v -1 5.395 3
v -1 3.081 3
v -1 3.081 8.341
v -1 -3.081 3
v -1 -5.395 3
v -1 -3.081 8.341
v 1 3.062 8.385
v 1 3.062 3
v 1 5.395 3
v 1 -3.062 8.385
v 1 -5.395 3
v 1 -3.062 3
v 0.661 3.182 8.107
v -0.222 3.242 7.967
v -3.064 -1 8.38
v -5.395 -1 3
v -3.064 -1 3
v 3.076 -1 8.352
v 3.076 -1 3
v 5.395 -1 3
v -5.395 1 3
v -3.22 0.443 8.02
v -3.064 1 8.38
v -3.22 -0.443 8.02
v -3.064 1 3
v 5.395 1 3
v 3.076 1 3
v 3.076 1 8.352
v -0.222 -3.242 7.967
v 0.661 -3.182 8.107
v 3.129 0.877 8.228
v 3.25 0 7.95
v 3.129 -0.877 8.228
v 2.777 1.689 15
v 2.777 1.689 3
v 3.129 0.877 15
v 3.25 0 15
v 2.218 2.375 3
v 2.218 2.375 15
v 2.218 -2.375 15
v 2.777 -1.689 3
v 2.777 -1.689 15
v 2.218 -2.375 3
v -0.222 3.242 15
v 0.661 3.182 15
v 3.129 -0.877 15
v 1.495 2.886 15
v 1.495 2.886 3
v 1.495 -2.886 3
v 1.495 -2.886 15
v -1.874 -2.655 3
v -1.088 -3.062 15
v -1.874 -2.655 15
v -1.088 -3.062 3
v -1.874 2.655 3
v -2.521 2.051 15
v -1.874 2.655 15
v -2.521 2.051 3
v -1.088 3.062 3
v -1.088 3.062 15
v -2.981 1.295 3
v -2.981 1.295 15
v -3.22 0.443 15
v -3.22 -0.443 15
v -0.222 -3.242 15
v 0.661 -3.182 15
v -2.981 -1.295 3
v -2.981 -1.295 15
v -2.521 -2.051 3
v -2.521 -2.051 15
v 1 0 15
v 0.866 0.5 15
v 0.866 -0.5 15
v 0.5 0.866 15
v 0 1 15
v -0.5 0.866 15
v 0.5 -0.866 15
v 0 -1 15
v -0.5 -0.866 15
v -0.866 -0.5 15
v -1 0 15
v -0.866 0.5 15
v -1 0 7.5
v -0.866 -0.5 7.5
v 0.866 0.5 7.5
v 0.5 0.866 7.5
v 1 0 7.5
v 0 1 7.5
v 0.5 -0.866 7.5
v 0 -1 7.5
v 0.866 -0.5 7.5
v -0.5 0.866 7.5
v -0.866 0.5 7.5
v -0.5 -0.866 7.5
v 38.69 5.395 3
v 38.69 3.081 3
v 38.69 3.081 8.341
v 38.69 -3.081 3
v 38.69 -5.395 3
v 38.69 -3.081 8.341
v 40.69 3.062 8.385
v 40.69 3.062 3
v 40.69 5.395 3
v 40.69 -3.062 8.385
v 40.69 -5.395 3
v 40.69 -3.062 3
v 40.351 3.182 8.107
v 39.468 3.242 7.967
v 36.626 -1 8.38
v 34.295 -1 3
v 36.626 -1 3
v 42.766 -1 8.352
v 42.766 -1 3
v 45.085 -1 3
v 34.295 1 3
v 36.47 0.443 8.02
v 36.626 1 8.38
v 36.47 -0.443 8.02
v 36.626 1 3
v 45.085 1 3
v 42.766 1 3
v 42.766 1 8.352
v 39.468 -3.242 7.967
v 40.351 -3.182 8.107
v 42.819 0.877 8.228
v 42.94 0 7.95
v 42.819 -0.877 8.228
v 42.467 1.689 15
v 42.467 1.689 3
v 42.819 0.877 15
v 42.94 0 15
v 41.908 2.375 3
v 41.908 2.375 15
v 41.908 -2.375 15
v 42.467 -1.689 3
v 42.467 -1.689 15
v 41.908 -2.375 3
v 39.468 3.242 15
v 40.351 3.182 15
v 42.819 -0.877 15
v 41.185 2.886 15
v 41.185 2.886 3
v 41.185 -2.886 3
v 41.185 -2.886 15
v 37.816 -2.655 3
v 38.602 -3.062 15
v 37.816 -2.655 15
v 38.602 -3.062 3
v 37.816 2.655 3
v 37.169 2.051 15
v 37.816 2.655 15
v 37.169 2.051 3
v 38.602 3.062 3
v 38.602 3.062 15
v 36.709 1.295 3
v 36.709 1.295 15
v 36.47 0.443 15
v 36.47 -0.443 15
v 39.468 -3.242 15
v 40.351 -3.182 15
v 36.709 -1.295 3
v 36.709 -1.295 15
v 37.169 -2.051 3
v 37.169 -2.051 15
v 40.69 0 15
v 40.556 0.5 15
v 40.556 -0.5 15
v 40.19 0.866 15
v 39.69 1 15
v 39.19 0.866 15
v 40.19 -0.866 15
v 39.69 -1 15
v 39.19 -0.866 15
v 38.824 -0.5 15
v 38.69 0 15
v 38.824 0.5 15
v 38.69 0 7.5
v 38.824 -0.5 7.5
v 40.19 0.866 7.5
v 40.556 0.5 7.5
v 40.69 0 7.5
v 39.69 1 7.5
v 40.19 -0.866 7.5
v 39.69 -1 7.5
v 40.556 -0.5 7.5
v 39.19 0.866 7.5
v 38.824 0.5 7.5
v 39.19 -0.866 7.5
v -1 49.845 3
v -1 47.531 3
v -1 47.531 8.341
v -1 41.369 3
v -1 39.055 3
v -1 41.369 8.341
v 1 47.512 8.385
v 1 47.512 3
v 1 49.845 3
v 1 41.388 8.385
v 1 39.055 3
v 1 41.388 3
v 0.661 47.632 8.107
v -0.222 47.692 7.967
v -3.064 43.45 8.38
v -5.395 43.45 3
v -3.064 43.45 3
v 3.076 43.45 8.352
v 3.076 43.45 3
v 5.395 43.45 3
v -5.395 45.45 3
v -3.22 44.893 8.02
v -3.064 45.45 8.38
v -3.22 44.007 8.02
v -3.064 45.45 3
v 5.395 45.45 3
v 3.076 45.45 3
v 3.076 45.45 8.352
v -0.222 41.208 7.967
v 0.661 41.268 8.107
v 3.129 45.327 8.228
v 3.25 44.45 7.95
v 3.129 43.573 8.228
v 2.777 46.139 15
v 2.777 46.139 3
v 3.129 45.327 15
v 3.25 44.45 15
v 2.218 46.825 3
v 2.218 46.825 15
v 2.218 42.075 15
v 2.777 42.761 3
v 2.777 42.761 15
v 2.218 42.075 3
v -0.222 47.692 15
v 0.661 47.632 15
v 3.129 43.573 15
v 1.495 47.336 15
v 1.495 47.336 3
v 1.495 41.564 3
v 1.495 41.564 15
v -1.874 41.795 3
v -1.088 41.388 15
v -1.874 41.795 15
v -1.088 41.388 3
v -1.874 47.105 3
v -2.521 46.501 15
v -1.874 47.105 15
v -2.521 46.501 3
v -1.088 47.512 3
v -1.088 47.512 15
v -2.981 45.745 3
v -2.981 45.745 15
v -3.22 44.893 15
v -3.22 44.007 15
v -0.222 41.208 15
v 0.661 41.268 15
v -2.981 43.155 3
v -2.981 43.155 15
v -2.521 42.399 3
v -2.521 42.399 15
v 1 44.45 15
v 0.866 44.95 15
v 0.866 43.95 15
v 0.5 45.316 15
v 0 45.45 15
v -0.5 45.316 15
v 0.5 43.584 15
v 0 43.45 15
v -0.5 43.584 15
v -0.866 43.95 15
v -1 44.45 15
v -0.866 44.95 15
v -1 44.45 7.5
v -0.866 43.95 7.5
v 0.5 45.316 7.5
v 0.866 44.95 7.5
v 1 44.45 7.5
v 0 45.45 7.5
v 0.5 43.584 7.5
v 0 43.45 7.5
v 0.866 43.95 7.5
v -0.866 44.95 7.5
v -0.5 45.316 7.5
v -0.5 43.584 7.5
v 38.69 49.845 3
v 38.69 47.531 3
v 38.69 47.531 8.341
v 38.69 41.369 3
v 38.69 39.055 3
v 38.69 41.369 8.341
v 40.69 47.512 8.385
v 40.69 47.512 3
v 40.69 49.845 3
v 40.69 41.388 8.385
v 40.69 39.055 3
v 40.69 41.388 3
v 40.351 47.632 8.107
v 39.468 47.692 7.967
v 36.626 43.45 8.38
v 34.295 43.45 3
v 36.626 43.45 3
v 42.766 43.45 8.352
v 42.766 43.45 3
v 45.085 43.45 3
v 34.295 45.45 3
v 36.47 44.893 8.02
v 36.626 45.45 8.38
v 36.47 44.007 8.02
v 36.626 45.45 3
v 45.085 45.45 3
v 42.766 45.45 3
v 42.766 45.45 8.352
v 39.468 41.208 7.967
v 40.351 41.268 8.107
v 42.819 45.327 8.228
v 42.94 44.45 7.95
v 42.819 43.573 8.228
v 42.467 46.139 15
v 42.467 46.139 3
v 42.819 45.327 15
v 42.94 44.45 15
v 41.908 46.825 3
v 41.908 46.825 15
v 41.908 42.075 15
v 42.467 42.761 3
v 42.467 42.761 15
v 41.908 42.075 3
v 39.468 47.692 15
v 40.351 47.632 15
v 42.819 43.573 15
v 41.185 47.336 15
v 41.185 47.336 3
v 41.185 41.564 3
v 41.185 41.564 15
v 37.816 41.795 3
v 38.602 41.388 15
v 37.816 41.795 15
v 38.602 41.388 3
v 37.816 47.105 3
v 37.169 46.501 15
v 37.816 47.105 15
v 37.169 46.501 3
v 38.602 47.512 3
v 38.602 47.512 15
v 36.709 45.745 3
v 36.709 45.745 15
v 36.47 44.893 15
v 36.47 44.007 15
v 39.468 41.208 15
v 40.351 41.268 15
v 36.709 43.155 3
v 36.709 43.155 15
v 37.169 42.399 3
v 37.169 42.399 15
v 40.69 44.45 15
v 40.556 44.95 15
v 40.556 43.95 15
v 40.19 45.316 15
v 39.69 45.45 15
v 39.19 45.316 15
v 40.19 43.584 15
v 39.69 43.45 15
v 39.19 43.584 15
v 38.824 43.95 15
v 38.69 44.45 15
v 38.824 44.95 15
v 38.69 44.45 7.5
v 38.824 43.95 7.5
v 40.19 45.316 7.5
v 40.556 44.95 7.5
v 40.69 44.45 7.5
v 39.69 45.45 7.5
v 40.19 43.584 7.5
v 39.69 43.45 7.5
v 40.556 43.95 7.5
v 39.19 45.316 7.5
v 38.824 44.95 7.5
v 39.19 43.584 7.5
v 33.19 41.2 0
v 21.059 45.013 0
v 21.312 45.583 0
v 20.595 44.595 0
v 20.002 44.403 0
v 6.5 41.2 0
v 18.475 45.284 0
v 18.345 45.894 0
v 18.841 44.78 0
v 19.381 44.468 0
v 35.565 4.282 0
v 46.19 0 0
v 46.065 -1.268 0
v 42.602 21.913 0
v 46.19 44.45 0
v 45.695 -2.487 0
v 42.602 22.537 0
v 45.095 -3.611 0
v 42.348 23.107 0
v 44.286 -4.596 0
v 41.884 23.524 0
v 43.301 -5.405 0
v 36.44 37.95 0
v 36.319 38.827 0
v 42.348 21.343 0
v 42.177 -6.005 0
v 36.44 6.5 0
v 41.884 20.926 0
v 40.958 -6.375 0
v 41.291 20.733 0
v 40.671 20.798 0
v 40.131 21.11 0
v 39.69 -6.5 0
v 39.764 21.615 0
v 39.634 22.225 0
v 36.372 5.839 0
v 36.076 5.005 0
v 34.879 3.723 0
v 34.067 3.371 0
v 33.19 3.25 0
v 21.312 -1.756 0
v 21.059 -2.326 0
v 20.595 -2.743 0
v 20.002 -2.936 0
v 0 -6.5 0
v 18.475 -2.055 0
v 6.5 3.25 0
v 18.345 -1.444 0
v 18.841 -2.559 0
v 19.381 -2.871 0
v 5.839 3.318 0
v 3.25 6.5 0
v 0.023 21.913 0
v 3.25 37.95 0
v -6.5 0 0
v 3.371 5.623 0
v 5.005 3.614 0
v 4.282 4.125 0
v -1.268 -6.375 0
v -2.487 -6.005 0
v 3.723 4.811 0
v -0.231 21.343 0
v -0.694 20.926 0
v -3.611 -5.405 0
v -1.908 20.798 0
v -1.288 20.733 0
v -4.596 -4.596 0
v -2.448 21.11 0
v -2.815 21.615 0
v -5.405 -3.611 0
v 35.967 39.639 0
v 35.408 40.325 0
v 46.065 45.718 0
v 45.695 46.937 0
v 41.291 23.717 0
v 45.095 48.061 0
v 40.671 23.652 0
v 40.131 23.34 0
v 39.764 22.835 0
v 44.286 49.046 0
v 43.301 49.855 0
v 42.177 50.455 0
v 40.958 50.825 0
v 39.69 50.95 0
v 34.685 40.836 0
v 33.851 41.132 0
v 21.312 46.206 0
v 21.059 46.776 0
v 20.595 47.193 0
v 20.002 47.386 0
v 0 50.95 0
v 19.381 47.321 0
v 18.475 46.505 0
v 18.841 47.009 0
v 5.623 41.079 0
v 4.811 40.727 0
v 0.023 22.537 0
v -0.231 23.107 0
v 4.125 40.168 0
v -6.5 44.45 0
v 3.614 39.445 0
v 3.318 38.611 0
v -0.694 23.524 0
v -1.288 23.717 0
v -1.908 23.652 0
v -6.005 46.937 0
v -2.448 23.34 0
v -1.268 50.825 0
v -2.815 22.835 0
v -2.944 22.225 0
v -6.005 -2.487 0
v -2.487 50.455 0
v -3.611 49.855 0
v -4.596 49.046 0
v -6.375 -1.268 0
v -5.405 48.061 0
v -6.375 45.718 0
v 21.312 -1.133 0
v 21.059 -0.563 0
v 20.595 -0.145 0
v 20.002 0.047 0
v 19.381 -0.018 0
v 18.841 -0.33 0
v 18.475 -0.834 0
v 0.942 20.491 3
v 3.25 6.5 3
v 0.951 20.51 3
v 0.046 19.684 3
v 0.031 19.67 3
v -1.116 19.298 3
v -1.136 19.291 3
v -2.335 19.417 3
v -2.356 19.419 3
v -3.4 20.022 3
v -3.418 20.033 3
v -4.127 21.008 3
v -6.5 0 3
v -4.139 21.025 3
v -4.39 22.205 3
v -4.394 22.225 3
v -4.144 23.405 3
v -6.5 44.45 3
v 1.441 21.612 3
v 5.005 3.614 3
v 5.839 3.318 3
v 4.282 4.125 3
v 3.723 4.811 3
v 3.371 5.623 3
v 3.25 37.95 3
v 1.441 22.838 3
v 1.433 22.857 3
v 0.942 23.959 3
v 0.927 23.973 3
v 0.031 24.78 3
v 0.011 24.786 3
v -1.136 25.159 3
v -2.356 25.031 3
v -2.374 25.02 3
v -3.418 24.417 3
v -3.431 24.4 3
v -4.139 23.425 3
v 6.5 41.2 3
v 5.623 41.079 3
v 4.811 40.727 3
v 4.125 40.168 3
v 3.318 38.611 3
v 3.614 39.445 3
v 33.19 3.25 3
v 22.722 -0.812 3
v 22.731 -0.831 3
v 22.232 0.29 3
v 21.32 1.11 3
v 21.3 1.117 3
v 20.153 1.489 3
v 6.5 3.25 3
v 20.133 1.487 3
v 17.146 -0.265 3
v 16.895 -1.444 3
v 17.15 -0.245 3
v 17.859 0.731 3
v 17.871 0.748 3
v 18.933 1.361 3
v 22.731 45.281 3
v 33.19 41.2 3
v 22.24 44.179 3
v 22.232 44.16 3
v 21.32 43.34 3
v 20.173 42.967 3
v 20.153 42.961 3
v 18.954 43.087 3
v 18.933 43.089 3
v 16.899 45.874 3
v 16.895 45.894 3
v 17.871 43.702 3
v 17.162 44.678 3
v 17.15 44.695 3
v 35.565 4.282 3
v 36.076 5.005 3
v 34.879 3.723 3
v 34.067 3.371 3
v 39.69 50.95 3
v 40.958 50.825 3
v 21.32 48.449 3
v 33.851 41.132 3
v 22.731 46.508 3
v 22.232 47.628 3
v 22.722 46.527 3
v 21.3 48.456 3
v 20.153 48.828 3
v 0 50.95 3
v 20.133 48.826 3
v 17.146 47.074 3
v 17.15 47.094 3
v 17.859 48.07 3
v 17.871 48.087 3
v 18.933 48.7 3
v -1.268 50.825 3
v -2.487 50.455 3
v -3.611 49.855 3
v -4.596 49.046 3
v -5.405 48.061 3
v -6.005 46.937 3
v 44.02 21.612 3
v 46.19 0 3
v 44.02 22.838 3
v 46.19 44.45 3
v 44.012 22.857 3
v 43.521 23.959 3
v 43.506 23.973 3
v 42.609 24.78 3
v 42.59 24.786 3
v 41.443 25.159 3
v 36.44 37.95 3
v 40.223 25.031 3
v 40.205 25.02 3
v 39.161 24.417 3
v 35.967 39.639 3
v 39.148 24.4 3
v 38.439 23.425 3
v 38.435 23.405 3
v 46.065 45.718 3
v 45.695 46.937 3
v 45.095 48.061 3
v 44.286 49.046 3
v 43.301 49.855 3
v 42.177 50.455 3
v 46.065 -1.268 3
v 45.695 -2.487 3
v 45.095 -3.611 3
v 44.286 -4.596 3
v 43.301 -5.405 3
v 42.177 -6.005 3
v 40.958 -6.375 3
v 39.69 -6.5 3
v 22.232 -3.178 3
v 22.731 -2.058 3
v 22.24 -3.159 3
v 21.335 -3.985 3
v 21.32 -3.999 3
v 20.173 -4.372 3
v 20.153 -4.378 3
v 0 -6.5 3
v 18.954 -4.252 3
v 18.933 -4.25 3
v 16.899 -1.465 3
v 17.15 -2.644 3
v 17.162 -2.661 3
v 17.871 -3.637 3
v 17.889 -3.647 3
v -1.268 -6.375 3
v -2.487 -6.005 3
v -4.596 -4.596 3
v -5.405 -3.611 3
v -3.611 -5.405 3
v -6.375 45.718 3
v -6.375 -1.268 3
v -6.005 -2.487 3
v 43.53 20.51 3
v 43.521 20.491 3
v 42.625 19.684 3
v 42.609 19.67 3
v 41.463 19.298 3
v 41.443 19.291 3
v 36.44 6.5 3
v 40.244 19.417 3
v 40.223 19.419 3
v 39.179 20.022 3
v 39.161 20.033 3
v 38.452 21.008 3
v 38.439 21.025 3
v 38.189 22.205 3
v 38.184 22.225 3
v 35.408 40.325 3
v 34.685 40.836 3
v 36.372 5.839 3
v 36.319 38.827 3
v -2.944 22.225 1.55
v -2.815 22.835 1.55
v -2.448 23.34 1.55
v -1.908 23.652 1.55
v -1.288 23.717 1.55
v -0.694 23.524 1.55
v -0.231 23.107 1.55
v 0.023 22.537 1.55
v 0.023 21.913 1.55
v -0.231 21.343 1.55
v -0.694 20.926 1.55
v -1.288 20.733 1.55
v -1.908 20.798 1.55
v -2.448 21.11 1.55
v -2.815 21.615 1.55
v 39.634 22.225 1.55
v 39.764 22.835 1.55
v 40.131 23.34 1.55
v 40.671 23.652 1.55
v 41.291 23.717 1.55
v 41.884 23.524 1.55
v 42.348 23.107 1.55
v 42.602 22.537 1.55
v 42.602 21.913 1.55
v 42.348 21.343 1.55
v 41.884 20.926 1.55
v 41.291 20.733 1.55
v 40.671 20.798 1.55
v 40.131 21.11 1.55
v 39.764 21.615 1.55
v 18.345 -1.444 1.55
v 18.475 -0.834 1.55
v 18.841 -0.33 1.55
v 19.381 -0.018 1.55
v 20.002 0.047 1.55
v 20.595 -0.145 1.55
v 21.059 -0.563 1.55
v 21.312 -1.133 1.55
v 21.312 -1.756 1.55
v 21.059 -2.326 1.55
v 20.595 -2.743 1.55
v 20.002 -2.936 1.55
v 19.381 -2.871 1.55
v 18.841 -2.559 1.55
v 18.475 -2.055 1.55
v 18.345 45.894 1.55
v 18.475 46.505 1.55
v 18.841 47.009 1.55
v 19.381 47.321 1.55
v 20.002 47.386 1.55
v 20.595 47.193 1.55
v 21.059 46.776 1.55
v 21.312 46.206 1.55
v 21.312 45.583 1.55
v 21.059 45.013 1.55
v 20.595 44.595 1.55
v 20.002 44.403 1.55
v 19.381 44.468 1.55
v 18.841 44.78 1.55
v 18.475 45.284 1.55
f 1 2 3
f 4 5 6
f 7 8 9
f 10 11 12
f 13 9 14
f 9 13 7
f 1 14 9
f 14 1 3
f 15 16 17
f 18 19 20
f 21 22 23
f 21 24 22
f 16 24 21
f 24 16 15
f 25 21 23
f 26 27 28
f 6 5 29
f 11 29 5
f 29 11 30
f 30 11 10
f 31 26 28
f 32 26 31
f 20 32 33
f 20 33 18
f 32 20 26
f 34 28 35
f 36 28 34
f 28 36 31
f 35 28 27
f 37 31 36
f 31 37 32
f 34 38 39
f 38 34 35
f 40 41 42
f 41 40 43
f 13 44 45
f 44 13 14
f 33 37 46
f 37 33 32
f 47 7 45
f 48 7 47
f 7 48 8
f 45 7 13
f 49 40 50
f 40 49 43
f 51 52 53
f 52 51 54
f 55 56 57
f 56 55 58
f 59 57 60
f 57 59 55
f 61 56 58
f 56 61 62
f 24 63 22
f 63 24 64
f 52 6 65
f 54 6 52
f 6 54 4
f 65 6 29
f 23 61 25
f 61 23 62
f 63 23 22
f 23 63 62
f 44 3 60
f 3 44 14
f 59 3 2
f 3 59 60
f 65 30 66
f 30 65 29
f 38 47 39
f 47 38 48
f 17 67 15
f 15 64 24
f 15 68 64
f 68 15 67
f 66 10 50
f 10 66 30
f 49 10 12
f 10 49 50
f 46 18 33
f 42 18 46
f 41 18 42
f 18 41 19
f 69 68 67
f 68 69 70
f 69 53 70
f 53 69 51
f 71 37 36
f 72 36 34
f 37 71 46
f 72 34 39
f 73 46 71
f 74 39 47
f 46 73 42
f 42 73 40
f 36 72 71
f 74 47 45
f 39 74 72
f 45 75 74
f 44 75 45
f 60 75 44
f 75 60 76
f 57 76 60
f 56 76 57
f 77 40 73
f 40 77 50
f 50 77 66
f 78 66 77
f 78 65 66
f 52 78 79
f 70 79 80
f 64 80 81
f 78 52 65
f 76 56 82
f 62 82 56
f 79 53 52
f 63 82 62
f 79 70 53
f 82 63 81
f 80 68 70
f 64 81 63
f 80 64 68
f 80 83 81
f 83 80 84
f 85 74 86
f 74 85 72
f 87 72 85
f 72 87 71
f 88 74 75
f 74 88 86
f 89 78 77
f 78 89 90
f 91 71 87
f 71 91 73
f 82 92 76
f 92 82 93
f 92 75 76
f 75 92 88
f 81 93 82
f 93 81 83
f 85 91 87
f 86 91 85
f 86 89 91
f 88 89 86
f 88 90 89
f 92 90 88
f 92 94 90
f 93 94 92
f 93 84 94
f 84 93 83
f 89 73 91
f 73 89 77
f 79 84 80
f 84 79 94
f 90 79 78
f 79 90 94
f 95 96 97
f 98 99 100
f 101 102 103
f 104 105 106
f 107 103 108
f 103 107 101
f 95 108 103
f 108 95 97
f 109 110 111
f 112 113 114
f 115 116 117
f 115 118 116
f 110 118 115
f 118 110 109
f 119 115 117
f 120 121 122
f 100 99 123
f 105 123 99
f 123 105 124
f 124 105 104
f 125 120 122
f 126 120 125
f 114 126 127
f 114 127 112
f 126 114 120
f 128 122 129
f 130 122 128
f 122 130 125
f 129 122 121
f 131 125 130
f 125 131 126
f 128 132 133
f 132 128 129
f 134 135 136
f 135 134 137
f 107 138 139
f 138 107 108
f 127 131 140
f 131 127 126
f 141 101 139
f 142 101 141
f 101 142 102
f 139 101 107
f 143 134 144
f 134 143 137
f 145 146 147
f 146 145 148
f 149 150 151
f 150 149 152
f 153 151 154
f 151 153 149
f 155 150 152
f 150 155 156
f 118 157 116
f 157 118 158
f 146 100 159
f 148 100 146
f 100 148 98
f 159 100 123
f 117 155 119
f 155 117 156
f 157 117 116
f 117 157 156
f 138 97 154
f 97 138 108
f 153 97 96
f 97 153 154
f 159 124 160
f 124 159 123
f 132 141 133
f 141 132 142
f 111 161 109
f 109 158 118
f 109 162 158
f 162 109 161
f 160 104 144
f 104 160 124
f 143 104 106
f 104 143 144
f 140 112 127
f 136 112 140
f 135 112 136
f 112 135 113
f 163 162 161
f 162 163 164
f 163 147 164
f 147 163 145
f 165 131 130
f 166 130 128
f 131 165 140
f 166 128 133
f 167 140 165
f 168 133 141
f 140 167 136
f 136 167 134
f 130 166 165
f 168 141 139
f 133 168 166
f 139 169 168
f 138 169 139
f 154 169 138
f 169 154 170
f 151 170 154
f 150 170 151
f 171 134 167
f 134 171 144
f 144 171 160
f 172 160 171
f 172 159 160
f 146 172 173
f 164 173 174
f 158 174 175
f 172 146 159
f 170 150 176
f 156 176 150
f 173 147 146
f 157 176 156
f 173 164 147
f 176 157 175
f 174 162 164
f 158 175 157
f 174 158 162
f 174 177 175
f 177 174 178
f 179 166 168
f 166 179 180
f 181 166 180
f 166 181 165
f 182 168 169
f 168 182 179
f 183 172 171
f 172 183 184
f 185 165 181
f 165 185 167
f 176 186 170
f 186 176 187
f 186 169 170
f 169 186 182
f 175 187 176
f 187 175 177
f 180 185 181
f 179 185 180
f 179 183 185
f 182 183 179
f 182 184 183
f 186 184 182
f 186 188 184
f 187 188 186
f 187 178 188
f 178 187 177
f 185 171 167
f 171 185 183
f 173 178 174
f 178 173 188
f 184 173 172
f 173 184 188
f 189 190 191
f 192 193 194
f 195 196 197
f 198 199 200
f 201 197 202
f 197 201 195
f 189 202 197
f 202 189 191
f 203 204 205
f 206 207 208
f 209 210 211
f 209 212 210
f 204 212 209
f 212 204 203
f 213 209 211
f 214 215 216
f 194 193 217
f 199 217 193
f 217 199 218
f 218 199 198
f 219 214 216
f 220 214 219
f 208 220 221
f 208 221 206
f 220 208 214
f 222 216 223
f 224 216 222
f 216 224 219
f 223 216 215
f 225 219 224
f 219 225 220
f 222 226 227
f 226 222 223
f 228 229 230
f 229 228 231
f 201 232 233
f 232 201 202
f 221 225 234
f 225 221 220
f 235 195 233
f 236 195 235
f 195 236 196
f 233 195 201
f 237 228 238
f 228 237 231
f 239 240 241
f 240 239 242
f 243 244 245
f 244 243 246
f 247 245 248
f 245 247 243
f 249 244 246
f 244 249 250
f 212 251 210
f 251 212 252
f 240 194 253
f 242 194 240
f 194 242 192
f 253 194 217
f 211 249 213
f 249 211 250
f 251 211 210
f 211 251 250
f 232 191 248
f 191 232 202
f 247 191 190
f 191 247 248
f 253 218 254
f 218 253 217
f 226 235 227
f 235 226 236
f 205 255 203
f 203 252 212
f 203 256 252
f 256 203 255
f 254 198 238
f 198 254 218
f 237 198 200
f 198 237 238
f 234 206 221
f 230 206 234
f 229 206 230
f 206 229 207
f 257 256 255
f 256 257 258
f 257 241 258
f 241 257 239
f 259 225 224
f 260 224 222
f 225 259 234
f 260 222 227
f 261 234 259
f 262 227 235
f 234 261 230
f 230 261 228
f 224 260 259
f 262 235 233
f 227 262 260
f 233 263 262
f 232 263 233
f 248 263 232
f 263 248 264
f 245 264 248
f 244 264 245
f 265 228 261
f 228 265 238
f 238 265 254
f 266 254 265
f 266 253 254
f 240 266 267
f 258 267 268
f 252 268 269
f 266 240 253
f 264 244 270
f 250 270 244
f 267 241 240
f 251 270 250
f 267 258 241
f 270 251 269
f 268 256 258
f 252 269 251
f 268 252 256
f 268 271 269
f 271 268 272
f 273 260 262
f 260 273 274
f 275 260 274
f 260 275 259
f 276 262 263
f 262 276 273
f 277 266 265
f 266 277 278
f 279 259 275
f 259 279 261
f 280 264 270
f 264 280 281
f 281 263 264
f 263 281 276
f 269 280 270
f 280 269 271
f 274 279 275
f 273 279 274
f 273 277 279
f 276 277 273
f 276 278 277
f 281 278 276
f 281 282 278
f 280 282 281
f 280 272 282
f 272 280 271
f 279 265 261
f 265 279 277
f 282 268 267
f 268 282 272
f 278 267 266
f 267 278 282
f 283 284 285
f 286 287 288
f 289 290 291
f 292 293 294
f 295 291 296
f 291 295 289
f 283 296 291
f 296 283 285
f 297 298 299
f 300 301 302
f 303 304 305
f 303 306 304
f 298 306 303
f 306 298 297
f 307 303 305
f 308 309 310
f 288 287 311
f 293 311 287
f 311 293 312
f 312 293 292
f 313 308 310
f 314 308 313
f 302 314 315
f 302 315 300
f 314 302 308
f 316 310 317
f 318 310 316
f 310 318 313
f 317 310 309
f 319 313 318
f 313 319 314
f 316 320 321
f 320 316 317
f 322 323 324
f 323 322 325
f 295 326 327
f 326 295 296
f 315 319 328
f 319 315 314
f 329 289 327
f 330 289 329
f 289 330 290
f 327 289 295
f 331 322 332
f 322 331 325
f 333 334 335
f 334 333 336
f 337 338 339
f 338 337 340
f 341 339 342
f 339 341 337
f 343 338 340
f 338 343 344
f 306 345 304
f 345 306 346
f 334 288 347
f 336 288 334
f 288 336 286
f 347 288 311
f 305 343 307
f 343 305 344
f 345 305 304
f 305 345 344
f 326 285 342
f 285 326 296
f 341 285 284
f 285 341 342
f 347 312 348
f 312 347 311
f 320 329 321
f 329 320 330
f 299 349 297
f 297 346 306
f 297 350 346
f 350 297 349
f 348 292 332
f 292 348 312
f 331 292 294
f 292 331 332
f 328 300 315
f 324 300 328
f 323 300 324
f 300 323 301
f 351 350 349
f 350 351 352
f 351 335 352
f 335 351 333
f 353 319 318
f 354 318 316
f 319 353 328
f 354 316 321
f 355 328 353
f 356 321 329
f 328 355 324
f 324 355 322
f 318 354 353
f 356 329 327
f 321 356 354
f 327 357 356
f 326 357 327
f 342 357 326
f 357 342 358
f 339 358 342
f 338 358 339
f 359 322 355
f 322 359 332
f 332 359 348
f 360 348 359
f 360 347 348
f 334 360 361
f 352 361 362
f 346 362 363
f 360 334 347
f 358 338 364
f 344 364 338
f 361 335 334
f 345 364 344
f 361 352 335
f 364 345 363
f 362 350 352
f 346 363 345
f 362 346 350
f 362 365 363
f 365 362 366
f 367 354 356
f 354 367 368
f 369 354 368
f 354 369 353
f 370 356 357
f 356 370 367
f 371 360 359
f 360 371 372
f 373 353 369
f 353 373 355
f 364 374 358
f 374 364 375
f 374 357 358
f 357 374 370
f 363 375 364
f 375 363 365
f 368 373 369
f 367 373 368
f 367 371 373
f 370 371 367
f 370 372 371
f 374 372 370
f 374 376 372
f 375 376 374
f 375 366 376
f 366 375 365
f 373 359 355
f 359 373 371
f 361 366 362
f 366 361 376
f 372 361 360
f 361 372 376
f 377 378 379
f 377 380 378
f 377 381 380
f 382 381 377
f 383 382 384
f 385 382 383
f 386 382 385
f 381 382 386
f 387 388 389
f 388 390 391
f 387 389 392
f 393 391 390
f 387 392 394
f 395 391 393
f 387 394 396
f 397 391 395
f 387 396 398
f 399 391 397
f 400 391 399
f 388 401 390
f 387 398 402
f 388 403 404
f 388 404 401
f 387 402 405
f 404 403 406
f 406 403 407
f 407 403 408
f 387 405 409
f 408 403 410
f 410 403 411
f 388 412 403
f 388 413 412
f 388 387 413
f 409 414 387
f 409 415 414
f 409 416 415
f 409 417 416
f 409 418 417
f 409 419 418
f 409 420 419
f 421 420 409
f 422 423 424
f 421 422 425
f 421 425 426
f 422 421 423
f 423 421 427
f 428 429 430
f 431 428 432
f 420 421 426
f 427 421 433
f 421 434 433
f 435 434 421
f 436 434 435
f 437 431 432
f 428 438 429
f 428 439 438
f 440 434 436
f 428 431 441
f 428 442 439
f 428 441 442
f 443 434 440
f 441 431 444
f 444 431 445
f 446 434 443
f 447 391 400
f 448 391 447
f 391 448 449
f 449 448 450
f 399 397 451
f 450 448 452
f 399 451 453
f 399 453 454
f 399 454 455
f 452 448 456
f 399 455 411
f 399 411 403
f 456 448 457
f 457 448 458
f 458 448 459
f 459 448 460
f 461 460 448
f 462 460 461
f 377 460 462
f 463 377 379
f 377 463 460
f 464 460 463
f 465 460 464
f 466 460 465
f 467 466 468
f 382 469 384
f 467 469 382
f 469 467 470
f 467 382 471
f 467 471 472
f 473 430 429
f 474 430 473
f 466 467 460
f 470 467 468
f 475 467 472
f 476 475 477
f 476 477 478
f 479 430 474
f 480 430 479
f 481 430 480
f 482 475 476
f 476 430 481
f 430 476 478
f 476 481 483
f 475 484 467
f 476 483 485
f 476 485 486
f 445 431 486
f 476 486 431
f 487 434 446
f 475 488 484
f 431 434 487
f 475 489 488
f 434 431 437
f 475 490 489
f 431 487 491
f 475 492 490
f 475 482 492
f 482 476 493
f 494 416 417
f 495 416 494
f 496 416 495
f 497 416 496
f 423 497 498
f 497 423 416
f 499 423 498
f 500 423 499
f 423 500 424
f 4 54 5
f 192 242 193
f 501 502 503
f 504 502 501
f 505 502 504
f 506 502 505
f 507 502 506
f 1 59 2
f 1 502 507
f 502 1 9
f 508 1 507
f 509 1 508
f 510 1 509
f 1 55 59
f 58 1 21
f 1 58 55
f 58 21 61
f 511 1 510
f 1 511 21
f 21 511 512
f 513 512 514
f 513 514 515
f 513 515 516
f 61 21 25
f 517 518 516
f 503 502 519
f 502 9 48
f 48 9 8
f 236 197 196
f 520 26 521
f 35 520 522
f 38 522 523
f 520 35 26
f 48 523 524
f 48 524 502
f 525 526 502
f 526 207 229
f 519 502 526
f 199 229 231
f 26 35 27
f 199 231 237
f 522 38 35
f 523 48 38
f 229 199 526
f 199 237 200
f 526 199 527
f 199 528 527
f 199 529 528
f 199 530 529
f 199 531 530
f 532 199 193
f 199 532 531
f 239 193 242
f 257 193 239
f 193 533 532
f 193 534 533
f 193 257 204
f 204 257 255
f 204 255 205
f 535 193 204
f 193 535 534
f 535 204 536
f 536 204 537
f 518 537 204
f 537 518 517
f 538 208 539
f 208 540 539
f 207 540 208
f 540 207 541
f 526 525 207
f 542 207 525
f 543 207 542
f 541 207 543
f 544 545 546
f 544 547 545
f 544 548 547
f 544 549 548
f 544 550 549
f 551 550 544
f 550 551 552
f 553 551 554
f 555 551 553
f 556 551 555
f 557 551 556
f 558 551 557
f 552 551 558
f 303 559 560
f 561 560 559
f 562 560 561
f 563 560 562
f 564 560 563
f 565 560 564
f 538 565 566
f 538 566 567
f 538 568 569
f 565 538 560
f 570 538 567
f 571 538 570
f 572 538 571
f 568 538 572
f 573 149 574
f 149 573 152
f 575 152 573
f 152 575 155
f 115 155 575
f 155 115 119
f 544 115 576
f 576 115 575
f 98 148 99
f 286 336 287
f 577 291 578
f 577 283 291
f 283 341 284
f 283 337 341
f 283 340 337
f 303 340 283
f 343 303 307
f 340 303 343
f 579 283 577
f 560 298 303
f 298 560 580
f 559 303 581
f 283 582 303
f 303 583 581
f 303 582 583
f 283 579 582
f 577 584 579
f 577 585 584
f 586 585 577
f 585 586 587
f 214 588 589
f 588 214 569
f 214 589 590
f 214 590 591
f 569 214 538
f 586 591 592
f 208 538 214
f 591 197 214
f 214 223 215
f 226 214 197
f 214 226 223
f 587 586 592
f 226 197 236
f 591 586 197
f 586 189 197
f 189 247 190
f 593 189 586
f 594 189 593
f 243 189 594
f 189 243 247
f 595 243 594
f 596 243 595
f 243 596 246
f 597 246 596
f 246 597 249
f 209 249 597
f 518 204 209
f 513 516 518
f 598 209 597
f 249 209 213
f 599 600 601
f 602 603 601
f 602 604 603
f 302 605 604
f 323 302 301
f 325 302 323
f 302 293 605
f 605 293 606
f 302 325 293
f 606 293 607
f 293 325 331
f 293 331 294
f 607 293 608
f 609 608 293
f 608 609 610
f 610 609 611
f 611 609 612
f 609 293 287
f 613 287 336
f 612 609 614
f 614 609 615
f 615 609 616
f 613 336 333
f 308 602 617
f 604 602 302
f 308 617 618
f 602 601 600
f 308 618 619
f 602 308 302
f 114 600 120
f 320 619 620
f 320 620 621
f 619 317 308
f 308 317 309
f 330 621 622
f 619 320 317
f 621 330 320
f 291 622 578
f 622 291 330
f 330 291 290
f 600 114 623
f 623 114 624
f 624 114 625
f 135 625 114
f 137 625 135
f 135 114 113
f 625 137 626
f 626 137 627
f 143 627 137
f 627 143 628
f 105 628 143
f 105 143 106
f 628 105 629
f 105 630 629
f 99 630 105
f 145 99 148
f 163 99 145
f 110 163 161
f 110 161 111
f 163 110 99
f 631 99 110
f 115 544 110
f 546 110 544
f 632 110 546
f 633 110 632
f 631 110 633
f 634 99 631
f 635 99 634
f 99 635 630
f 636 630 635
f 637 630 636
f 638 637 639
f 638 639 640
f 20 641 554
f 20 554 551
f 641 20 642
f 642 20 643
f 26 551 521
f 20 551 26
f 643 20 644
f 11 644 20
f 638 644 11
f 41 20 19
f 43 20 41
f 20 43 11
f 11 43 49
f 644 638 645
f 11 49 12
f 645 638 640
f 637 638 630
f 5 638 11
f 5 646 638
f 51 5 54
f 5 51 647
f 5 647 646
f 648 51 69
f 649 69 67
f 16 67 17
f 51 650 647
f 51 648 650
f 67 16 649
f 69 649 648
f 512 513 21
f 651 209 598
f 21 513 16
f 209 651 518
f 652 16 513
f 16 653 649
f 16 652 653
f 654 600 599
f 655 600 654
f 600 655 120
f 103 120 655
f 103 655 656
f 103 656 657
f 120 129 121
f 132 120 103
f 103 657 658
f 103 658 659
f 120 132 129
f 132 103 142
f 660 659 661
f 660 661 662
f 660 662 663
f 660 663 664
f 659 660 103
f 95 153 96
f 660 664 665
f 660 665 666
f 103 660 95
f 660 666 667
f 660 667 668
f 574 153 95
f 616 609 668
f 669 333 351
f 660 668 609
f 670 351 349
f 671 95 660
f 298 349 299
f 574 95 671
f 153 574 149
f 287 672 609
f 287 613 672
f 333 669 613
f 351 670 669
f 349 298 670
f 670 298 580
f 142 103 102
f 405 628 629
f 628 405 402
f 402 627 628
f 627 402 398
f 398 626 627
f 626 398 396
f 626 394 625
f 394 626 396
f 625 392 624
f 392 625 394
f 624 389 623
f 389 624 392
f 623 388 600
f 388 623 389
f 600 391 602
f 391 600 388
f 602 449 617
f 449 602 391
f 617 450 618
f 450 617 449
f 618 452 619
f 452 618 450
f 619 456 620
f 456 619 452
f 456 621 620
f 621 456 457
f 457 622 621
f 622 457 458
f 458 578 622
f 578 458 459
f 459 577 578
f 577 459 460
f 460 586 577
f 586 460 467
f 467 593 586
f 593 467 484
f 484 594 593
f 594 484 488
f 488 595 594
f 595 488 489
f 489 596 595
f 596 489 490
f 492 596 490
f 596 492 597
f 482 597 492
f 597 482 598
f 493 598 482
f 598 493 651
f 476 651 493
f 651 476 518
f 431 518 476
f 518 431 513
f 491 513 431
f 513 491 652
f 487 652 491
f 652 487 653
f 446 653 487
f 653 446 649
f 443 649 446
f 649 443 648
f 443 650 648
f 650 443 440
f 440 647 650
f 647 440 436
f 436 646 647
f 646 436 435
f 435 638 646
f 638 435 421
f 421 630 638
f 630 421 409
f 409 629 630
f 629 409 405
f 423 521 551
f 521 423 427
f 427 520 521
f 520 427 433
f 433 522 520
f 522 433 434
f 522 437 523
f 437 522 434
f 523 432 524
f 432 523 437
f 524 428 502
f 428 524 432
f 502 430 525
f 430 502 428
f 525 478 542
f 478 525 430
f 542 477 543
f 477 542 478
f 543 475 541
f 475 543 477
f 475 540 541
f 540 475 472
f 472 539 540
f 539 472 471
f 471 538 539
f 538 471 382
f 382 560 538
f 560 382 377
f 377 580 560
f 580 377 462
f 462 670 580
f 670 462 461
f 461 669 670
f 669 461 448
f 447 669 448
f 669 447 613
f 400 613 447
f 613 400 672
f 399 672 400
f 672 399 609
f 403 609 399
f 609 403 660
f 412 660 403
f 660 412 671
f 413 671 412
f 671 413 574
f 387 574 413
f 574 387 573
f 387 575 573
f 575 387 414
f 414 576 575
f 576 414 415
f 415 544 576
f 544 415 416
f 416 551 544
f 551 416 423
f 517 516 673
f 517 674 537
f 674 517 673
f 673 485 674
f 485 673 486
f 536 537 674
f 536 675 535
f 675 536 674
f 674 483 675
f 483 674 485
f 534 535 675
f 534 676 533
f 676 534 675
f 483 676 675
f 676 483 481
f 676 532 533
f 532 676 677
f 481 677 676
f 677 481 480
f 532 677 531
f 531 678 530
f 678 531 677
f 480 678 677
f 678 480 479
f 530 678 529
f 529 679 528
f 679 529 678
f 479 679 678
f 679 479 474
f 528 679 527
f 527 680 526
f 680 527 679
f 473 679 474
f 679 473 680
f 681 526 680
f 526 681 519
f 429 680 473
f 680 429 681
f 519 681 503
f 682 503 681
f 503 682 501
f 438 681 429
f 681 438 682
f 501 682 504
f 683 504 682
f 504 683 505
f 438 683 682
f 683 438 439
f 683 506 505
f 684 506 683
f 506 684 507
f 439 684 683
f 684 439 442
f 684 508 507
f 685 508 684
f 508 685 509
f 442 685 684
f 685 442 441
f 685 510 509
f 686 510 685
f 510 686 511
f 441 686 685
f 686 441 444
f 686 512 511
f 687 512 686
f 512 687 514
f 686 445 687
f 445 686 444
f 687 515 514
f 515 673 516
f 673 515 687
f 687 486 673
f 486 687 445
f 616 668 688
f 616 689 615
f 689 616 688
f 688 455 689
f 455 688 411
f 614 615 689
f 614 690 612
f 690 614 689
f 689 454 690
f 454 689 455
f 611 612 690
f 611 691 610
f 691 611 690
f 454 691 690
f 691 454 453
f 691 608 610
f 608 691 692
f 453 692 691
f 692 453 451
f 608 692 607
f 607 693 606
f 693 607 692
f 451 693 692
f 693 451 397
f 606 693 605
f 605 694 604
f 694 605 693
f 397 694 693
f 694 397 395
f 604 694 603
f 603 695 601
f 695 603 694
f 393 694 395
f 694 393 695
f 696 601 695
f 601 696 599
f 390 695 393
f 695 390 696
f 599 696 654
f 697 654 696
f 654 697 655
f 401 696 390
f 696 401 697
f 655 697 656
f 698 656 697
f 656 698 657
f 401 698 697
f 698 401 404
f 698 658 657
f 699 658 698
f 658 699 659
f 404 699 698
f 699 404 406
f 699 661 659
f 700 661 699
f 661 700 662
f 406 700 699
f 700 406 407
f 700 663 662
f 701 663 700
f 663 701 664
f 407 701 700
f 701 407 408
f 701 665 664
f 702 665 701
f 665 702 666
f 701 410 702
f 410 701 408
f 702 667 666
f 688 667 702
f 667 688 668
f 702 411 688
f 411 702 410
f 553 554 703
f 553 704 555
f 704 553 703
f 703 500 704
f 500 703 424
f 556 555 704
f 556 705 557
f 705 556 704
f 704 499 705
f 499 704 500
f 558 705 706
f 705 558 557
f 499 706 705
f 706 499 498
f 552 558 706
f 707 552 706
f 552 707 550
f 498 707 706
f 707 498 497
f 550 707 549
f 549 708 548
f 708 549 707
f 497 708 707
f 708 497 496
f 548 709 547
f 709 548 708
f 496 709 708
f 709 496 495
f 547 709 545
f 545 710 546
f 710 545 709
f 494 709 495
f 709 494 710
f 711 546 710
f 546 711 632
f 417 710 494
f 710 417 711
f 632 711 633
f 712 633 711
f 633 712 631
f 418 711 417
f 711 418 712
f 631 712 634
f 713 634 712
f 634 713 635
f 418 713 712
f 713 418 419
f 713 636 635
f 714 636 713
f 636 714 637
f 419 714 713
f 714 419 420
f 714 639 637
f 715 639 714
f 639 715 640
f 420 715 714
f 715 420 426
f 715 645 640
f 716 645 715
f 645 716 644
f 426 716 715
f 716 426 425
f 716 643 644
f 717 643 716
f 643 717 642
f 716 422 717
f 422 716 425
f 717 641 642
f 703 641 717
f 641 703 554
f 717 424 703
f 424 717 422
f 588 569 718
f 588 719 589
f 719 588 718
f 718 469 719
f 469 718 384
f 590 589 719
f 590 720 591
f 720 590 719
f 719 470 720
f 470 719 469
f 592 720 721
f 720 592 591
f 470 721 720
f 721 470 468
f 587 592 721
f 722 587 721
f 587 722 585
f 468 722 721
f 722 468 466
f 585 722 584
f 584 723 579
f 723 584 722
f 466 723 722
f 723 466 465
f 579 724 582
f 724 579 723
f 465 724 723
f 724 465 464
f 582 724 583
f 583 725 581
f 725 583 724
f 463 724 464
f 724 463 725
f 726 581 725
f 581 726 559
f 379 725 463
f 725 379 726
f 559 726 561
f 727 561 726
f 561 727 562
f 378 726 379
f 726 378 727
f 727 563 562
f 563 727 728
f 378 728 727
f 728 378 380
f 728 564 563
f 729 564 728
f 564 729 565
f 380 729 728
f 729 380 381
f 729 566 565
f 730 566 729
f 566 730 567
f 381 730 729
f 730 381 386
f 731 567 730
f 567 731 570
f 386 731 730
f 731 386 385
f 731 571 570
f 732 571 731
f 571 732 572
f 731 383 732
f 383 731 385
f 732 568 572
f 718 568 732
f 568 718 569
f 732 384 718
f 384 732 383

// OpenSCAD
//------------------------------------------------------------------
/*

4 Pillar PCB Mount

*/
//------------------------------------------------------------------

mount_width = 39.69;
mount_length = 44.45;
mount_height = 15;
mount_base_z = 3;
mount_hole_diameter = 3;

pillar_diameter = 6.5;
pillar_hole_diameter = 2;

//------------------------------------------------------------------

// small tweak to avoid differencing artifacts
epsilon = 0.05;

// control the number of facets on cylinders
facet_epsilon = 0.03;
function facets(r) = 180 / acos(1 - (facet_epsilon / r));

// rounded polygons
module rounded(r=1) {
  offset(r=r, $fn=facets(r)) offset(r=-r, $fn=facets(r)) children(0);
}

// filleted polygons
module filleted(r=1) {
  offset(r=-r, $fn=facets(r)) render() offset(r=r, $fn=facets(r)) children(0);
}

//------------------------------------------------------------------
// Mounting pillar with support webs

// single web
module pillar_web(
  web_height,
  web_radius,
  web_width
) {
  h = web_height;
  r = web_radius;
  w = web_width;
  points = [
    [0,0],
    [r,0],
    [0,h],
  ];
  rotate([90,0,0]) translate([0,0,-w/2]) linear_extrude(height=w) polygon(points=points);
}

// multiple webs
module pillar_webs(
  number_webs,
  web_height,
  web_radius,
  web_width
) {
  theta = 360 / number_webs;
  for (i = [1:number_webs]) {
    rotate([0,0,i * theta]) pillar_web(web_height, web_radius, web_width);
  }
}

// pillar
module pillar(
  pillar_height,
  pillar_radius
) {
  h = pillar_height;
  r = pillar_radius;
  cylinder(h=h, r=r, $fn=facets(r));
}

module pillar_hole(
  pillar_height,
  hole_depth,
  hole_radius
) {
  h = hole_depth + epsilon;
  r = hole_radius;
  z_ofs = pillar_height - hole_depth;
  translate([0,0,z_ofs]) cylinder(h=h, r=r, $fn=facets(r));
}

// pillar with webs
module webbed_pillar(
  pillar_height,
  pillar_radius,
  hole_depth,
  hole_radius,
  number_webs,
  web_height,
  web_radius,
  web_width,
) {
  intersection () {
    difference() {
      union() {
        pillar(pillar_height, pillar_radius);
        pillar_webs(number_webs, web_height, web_radius, web_width);
      }
      pillar_hole(pillar_height, hole_depth, hole_radius);
    }
    // Cut off any part of the webs that protrude from the
    // top of the pillar.
    cylinder(r = web_radius * 2, h = pillar_height);
  }
}

//------------------------------------------------------------------

// countersunk hole
module hole_countersunk(
  length,
  radius,
) {
  l = length;
  r = radius;
  if (r > l) {
    points = [
      [0, 0],
      [(2 * r) - l, 0],
      [2 * r, l],
      [0, l]
    ];
    rotate_extrude($fn=facets(r)) polygon(points=points);
  } else {
    points = [
      [0, 0],
      [r, 0],
      [r, l - r],
      [2 * r, l],
      [0, l]
    ];
    rotate_extrude($fn=facets(r)) polygon(points=points);
  }
}

//------------------------------------------------------------------

module mount_pillar() {
  z = mount_height - mount_base_z + epsilon;
  z_ofs = mount_base_z - epsilon;
  translate([0,0,z_ofs]) webbed_pillar(
    pillar_height = z,
    pillar_radius = pillar_diameter / 2,
    hole_depth = mount_height / 2,
    hole_radius = pillar_hole_diameter / 2,
    number_webs = 4,
    web_height = mount_height / 1.2,
    web_radius = pillar_diameter / 1.2,
    web_width = 2
  );
}

module pcb_mount_hole() {
  h = mount_base_z + (2 * epsilon);
  r = mount_hole_diameter / 2;
  translate([0,0,-epsilon])hole_countersunk(h, r);
}

module mount_base_2d() {
  w = mount_width;
  l = mount_length;
  points = [
    [0,0],
    [w,0],
    [w,l],
    [0,l],
  ];
  polygon(points=points);
}

//------------------------------------------------------------------

module pcb_mount_base() {
  r0 = pillar_diameter;
  r1 = r0 / 2.0;
  h = mount_base_z;
  linear_extrude(height = h) difference() {
    offset(r=r0, $fn=facets(r0)) mount_base_2d();
    rounded(r=r1) offset(r=-r1, $fn=facets(r1)) mount_base_2d();
  }
}

module pcb_mount_pillars() {
  w = mount_width;
  l = mount_length;
  translate([0,0]) mount_pillar();
  translate([w,0]) mount_pillar();
  translate([0,l]) mount_pillar();
  translate([w,l]) mount_pillar();
}

module pcb_mount_holes() {
  w = mount_width;
  l = mount_length;
  ofs = pillar_diameter / 4.5;
  y_mid = l/2;
  x_mid = w/2;
  translate([-ofs,y_mid]) pcb_mount_hole();
  translate([w+ofs, y_mid]) pcb_mount_hole();
  translate([x_mid,-ofs]) pcb_mount_hole();
  translate([x_mid,l+ofs]) pcb_mount_hole();
}

//------------------------------------------------------------------

module pcb_mount() {
  difference() {
    union() {
      pcb_mount_base();
      pcb_mount_pillars();
    }
    pcb_mount_holes();
  }
}

pcb_mount();

//------------------------------------------------------------------
